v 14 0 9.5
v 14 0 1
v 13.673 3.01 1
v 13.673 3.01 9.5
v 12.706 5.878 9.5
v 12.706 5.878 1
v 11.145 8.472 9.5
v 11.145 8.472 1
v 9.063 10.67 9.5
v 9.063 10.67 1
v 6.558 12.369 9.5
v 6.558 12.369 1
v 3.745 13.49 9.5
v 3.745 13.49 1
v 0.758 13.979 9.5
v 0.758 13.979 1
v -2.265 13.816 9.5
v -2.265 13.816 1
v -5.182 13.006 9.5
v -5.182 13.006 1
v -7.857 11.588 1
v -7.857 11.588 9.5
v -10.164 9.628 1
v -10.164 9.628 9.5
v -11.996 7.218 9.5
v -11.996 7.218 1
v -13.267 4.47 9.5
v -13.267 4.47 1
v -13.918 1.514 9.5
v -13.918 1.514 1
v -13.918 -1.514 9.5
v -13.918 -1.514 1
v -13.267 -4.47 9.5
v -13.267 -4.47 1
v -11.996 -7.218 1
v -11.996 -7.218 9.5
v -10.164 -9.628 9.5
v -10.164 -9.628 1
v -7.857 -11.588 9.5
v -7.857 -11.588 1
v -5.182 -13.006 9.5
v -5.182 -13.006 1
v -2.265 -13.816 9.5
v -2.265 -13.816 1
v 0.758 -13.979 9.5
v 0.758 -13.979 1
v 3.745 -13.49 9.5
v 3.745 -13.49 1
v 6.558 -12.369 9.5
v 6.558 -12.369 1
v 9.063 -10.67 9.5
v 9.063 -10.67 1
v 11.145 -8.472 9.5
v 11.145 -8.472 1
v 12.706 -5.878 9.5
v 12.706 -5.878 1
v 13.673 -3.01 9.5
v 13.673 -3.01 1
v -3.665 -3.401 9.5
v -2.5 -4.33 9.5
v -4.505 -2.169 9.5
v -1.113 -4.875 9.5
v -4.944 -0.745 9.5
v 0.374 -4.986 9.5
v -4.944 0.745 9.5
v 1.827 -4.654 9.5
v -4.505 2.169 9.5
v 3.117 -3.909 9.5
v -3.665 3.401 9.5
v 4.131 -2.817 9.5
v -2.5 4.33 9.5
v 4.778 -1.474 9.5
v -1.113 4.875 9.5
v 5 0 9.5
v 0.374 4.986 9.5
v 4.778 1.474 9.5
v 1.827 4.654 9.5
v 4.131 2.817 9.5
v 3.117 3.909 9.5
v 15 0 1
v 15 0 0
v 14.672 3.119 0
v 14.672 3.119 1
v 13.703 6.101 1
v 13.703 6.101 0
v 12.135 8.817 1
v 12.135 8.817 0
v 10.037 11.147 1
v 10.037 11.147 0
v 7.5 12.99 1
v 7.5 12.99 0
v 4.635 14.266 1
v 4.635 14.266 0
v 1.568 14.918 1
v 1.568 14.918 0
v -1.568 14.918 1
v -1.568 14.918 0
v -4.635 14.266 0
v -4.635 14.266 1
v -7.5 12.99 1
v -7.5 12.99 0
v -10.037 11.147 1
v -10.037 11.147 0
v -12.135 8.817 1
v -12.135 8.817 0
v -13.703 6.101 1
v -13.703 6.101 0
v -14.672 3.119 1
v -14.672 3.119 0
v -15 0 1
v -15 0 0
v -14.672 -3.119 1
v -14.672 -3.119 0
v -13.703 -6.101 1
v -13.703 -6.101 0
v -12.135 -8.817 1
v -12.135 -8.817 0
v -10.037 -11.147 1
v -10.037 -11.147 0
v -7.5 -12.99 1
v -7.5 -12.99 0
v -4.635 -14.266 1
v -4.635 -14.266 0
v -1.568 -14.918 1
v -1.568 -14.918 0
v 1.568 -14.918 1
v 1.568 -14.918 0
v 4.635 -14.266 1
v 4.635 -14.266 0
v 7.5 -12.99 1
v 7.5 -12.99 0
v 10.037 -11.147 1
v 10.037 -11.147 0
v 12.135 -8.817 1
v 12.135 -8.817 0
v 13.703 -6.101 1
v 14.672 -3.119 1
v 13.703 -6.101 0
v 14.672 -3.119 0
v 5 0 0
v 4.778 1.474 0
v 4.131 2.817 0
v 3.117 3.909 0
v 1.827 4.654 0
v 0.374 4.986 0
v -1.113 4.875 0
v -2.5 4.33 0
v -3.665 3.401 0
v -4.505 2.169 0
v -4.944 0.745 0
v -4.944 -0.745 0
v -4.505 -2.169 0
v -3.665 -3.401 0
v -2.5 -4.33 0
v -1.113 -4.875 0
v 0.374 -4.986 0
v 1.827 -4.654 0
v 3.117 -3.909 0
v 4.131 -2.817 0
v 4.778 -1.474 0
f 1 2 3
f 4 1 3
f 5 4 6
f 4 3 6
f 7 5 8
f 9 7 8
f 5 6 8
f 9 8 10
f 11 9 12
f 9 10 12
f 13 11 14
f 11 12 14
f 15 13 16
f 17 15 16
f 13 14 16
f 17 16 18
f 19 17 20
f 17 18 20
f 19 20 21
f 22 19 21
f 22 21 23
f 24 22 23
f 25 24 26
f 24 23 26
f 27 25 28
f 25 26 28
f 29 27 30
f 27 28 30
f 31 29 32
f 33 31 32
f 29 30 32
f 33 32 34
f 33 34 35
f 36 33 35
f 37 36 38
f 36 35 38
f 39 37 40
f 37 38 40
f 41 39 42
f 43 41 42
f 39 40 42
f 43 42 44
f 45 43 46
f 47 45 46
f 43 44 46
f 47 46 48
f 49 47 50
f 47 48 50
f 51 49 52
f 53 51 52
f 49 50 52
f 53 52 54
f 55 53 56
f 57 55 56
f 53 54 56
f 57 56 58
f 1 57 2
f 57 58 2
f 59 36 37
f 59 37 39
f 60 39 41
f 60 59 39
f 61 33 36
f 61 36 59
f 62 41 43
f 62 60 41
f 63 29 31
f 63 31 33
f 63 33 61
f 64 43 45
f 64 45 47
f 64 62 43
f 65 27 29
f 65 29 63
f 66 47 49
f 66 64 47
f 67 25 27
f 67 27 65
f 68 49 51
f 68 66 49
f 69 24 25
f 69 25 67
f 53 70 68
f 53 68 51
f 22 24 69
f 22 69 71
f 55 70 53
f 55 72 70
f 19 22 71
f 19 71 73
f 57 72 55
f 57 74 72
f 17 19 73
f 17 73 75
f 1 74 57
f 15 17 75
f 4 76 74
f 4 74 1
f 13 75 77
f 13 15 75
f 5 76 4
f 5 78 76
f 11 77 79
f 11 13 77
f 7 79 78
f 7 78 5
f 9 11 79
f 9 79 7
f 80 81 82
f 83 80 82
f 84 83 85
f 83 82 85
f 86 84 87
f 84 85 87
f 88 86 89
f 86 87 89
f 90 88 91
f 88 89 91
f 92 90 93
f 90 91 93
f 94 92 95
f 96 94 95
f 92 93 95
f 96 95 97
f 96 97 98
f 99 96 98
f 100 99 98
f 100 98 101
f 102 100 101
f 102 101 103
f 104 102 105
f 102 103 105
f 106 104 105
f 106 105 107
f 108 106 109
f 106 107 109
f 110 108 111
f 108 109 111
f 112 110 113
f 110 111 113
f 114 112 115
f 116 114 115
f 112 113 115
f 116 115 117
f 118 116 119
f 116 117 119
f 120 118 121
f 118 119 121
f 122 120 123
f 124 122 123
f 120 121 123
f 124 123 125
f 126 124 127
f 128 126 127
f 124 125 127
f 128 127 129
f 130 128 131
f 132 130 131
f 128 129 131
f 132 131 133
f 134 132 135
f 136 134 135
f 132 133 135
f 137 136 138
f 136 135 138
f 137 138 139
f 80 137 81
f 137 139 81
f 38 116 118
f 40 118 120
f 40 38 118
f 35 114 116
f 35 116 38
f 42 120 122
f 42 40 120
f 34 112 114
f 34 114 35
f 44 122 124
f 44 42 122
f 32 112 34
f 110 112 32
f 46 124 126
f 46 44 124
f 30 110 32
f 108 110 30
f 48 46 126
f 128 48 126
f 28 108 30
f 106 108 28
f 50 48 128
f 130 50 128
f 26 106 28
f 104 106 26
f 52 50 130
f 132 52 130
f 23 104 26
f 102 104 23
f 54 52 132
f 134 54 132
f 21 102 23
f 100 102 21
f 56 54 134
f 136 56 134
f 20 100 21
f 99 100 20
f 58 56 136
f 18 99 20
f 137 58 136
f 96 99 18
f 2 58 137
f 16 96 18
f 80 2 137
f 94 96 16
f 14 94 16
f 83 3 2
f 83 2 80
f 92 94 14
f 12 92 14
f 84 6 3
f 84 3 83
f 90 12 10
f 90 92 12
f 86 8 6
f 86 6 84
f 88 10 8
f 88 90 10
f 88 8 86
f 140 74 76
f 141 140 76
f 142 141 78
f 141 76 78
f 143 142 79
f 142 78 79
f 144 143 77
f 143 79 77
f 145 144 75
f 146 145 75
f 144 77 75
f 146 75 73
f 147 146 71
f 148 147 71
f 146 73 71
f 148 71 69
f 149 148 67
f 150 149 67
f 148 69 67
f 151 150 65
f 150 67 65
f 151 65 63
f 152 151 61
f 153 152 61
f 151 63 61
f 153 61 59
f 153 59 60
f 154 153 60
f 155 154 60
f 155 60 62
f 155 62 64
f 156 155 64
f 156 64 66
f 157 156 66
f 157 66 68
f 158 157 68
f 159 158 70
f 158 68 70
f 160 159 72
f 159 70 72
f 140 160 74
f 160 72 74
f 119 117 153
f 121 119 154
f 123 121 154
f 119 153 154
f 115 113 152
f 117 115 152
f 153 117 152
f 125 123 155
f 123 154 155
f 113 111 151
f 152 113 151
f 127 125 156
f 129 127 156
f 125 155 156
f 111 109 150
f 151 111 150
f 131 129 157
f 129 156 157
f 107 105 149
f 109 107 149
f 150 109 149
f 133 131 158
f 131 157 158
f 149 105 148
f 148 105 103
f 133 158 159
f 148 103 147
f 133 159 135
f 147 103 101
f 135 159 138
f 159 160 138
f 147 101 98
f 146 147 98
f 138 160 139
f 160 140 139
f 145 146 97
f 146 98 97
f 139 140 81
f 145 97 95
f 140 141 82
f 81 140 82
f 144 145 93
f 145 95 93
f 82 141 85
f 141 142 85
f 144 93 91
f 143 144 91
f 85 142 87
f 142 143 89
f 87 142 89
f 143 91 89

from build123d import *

# Parameters (mm, degrees)
F0_R     = 15
F1_DEPTH = 1
F2_R     = 14
F3_DEPTH = 8.5
F4_R     = 5
F5_DEPTH = 9.5


with BuildPart() as f1:
    # F0 (on Top) → F1 (new body)
    with BuildSketch(Plane.XY):
        Circle(F0_R)
    extrude(amount=F1_DEPTH)

    # F2 (on face) → F3 (join)
    with BuildSketch(Plane.XY.offset(1)):
        Circle(F2_R)
    extrude(amount=F3_DEPTH)

    # F4 (on face) → F5 (cut, through all)
    with BuildSketch(Plane.XY.offset(9.5)):
        Circle(F4_R)
    extrude(amount=-F5_DEPTH, mode=Mode.SUBTRACT)


solid = f1.part
